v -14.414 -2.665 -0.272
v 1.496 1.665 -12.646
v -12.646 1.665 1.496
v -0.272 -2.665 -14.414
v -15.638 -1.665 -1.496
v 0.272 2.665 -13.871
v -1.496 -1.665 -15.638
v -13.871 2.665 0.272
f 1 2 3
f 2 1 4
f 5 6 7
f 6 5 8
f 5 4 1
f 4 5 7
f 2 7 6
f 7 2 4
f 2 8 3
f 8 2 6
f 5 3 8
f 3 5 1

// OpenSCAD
rotate([0,45,0]) translate([0,0,-10]) rotate([30,0,0]) cube([20,5,2], center=true);
